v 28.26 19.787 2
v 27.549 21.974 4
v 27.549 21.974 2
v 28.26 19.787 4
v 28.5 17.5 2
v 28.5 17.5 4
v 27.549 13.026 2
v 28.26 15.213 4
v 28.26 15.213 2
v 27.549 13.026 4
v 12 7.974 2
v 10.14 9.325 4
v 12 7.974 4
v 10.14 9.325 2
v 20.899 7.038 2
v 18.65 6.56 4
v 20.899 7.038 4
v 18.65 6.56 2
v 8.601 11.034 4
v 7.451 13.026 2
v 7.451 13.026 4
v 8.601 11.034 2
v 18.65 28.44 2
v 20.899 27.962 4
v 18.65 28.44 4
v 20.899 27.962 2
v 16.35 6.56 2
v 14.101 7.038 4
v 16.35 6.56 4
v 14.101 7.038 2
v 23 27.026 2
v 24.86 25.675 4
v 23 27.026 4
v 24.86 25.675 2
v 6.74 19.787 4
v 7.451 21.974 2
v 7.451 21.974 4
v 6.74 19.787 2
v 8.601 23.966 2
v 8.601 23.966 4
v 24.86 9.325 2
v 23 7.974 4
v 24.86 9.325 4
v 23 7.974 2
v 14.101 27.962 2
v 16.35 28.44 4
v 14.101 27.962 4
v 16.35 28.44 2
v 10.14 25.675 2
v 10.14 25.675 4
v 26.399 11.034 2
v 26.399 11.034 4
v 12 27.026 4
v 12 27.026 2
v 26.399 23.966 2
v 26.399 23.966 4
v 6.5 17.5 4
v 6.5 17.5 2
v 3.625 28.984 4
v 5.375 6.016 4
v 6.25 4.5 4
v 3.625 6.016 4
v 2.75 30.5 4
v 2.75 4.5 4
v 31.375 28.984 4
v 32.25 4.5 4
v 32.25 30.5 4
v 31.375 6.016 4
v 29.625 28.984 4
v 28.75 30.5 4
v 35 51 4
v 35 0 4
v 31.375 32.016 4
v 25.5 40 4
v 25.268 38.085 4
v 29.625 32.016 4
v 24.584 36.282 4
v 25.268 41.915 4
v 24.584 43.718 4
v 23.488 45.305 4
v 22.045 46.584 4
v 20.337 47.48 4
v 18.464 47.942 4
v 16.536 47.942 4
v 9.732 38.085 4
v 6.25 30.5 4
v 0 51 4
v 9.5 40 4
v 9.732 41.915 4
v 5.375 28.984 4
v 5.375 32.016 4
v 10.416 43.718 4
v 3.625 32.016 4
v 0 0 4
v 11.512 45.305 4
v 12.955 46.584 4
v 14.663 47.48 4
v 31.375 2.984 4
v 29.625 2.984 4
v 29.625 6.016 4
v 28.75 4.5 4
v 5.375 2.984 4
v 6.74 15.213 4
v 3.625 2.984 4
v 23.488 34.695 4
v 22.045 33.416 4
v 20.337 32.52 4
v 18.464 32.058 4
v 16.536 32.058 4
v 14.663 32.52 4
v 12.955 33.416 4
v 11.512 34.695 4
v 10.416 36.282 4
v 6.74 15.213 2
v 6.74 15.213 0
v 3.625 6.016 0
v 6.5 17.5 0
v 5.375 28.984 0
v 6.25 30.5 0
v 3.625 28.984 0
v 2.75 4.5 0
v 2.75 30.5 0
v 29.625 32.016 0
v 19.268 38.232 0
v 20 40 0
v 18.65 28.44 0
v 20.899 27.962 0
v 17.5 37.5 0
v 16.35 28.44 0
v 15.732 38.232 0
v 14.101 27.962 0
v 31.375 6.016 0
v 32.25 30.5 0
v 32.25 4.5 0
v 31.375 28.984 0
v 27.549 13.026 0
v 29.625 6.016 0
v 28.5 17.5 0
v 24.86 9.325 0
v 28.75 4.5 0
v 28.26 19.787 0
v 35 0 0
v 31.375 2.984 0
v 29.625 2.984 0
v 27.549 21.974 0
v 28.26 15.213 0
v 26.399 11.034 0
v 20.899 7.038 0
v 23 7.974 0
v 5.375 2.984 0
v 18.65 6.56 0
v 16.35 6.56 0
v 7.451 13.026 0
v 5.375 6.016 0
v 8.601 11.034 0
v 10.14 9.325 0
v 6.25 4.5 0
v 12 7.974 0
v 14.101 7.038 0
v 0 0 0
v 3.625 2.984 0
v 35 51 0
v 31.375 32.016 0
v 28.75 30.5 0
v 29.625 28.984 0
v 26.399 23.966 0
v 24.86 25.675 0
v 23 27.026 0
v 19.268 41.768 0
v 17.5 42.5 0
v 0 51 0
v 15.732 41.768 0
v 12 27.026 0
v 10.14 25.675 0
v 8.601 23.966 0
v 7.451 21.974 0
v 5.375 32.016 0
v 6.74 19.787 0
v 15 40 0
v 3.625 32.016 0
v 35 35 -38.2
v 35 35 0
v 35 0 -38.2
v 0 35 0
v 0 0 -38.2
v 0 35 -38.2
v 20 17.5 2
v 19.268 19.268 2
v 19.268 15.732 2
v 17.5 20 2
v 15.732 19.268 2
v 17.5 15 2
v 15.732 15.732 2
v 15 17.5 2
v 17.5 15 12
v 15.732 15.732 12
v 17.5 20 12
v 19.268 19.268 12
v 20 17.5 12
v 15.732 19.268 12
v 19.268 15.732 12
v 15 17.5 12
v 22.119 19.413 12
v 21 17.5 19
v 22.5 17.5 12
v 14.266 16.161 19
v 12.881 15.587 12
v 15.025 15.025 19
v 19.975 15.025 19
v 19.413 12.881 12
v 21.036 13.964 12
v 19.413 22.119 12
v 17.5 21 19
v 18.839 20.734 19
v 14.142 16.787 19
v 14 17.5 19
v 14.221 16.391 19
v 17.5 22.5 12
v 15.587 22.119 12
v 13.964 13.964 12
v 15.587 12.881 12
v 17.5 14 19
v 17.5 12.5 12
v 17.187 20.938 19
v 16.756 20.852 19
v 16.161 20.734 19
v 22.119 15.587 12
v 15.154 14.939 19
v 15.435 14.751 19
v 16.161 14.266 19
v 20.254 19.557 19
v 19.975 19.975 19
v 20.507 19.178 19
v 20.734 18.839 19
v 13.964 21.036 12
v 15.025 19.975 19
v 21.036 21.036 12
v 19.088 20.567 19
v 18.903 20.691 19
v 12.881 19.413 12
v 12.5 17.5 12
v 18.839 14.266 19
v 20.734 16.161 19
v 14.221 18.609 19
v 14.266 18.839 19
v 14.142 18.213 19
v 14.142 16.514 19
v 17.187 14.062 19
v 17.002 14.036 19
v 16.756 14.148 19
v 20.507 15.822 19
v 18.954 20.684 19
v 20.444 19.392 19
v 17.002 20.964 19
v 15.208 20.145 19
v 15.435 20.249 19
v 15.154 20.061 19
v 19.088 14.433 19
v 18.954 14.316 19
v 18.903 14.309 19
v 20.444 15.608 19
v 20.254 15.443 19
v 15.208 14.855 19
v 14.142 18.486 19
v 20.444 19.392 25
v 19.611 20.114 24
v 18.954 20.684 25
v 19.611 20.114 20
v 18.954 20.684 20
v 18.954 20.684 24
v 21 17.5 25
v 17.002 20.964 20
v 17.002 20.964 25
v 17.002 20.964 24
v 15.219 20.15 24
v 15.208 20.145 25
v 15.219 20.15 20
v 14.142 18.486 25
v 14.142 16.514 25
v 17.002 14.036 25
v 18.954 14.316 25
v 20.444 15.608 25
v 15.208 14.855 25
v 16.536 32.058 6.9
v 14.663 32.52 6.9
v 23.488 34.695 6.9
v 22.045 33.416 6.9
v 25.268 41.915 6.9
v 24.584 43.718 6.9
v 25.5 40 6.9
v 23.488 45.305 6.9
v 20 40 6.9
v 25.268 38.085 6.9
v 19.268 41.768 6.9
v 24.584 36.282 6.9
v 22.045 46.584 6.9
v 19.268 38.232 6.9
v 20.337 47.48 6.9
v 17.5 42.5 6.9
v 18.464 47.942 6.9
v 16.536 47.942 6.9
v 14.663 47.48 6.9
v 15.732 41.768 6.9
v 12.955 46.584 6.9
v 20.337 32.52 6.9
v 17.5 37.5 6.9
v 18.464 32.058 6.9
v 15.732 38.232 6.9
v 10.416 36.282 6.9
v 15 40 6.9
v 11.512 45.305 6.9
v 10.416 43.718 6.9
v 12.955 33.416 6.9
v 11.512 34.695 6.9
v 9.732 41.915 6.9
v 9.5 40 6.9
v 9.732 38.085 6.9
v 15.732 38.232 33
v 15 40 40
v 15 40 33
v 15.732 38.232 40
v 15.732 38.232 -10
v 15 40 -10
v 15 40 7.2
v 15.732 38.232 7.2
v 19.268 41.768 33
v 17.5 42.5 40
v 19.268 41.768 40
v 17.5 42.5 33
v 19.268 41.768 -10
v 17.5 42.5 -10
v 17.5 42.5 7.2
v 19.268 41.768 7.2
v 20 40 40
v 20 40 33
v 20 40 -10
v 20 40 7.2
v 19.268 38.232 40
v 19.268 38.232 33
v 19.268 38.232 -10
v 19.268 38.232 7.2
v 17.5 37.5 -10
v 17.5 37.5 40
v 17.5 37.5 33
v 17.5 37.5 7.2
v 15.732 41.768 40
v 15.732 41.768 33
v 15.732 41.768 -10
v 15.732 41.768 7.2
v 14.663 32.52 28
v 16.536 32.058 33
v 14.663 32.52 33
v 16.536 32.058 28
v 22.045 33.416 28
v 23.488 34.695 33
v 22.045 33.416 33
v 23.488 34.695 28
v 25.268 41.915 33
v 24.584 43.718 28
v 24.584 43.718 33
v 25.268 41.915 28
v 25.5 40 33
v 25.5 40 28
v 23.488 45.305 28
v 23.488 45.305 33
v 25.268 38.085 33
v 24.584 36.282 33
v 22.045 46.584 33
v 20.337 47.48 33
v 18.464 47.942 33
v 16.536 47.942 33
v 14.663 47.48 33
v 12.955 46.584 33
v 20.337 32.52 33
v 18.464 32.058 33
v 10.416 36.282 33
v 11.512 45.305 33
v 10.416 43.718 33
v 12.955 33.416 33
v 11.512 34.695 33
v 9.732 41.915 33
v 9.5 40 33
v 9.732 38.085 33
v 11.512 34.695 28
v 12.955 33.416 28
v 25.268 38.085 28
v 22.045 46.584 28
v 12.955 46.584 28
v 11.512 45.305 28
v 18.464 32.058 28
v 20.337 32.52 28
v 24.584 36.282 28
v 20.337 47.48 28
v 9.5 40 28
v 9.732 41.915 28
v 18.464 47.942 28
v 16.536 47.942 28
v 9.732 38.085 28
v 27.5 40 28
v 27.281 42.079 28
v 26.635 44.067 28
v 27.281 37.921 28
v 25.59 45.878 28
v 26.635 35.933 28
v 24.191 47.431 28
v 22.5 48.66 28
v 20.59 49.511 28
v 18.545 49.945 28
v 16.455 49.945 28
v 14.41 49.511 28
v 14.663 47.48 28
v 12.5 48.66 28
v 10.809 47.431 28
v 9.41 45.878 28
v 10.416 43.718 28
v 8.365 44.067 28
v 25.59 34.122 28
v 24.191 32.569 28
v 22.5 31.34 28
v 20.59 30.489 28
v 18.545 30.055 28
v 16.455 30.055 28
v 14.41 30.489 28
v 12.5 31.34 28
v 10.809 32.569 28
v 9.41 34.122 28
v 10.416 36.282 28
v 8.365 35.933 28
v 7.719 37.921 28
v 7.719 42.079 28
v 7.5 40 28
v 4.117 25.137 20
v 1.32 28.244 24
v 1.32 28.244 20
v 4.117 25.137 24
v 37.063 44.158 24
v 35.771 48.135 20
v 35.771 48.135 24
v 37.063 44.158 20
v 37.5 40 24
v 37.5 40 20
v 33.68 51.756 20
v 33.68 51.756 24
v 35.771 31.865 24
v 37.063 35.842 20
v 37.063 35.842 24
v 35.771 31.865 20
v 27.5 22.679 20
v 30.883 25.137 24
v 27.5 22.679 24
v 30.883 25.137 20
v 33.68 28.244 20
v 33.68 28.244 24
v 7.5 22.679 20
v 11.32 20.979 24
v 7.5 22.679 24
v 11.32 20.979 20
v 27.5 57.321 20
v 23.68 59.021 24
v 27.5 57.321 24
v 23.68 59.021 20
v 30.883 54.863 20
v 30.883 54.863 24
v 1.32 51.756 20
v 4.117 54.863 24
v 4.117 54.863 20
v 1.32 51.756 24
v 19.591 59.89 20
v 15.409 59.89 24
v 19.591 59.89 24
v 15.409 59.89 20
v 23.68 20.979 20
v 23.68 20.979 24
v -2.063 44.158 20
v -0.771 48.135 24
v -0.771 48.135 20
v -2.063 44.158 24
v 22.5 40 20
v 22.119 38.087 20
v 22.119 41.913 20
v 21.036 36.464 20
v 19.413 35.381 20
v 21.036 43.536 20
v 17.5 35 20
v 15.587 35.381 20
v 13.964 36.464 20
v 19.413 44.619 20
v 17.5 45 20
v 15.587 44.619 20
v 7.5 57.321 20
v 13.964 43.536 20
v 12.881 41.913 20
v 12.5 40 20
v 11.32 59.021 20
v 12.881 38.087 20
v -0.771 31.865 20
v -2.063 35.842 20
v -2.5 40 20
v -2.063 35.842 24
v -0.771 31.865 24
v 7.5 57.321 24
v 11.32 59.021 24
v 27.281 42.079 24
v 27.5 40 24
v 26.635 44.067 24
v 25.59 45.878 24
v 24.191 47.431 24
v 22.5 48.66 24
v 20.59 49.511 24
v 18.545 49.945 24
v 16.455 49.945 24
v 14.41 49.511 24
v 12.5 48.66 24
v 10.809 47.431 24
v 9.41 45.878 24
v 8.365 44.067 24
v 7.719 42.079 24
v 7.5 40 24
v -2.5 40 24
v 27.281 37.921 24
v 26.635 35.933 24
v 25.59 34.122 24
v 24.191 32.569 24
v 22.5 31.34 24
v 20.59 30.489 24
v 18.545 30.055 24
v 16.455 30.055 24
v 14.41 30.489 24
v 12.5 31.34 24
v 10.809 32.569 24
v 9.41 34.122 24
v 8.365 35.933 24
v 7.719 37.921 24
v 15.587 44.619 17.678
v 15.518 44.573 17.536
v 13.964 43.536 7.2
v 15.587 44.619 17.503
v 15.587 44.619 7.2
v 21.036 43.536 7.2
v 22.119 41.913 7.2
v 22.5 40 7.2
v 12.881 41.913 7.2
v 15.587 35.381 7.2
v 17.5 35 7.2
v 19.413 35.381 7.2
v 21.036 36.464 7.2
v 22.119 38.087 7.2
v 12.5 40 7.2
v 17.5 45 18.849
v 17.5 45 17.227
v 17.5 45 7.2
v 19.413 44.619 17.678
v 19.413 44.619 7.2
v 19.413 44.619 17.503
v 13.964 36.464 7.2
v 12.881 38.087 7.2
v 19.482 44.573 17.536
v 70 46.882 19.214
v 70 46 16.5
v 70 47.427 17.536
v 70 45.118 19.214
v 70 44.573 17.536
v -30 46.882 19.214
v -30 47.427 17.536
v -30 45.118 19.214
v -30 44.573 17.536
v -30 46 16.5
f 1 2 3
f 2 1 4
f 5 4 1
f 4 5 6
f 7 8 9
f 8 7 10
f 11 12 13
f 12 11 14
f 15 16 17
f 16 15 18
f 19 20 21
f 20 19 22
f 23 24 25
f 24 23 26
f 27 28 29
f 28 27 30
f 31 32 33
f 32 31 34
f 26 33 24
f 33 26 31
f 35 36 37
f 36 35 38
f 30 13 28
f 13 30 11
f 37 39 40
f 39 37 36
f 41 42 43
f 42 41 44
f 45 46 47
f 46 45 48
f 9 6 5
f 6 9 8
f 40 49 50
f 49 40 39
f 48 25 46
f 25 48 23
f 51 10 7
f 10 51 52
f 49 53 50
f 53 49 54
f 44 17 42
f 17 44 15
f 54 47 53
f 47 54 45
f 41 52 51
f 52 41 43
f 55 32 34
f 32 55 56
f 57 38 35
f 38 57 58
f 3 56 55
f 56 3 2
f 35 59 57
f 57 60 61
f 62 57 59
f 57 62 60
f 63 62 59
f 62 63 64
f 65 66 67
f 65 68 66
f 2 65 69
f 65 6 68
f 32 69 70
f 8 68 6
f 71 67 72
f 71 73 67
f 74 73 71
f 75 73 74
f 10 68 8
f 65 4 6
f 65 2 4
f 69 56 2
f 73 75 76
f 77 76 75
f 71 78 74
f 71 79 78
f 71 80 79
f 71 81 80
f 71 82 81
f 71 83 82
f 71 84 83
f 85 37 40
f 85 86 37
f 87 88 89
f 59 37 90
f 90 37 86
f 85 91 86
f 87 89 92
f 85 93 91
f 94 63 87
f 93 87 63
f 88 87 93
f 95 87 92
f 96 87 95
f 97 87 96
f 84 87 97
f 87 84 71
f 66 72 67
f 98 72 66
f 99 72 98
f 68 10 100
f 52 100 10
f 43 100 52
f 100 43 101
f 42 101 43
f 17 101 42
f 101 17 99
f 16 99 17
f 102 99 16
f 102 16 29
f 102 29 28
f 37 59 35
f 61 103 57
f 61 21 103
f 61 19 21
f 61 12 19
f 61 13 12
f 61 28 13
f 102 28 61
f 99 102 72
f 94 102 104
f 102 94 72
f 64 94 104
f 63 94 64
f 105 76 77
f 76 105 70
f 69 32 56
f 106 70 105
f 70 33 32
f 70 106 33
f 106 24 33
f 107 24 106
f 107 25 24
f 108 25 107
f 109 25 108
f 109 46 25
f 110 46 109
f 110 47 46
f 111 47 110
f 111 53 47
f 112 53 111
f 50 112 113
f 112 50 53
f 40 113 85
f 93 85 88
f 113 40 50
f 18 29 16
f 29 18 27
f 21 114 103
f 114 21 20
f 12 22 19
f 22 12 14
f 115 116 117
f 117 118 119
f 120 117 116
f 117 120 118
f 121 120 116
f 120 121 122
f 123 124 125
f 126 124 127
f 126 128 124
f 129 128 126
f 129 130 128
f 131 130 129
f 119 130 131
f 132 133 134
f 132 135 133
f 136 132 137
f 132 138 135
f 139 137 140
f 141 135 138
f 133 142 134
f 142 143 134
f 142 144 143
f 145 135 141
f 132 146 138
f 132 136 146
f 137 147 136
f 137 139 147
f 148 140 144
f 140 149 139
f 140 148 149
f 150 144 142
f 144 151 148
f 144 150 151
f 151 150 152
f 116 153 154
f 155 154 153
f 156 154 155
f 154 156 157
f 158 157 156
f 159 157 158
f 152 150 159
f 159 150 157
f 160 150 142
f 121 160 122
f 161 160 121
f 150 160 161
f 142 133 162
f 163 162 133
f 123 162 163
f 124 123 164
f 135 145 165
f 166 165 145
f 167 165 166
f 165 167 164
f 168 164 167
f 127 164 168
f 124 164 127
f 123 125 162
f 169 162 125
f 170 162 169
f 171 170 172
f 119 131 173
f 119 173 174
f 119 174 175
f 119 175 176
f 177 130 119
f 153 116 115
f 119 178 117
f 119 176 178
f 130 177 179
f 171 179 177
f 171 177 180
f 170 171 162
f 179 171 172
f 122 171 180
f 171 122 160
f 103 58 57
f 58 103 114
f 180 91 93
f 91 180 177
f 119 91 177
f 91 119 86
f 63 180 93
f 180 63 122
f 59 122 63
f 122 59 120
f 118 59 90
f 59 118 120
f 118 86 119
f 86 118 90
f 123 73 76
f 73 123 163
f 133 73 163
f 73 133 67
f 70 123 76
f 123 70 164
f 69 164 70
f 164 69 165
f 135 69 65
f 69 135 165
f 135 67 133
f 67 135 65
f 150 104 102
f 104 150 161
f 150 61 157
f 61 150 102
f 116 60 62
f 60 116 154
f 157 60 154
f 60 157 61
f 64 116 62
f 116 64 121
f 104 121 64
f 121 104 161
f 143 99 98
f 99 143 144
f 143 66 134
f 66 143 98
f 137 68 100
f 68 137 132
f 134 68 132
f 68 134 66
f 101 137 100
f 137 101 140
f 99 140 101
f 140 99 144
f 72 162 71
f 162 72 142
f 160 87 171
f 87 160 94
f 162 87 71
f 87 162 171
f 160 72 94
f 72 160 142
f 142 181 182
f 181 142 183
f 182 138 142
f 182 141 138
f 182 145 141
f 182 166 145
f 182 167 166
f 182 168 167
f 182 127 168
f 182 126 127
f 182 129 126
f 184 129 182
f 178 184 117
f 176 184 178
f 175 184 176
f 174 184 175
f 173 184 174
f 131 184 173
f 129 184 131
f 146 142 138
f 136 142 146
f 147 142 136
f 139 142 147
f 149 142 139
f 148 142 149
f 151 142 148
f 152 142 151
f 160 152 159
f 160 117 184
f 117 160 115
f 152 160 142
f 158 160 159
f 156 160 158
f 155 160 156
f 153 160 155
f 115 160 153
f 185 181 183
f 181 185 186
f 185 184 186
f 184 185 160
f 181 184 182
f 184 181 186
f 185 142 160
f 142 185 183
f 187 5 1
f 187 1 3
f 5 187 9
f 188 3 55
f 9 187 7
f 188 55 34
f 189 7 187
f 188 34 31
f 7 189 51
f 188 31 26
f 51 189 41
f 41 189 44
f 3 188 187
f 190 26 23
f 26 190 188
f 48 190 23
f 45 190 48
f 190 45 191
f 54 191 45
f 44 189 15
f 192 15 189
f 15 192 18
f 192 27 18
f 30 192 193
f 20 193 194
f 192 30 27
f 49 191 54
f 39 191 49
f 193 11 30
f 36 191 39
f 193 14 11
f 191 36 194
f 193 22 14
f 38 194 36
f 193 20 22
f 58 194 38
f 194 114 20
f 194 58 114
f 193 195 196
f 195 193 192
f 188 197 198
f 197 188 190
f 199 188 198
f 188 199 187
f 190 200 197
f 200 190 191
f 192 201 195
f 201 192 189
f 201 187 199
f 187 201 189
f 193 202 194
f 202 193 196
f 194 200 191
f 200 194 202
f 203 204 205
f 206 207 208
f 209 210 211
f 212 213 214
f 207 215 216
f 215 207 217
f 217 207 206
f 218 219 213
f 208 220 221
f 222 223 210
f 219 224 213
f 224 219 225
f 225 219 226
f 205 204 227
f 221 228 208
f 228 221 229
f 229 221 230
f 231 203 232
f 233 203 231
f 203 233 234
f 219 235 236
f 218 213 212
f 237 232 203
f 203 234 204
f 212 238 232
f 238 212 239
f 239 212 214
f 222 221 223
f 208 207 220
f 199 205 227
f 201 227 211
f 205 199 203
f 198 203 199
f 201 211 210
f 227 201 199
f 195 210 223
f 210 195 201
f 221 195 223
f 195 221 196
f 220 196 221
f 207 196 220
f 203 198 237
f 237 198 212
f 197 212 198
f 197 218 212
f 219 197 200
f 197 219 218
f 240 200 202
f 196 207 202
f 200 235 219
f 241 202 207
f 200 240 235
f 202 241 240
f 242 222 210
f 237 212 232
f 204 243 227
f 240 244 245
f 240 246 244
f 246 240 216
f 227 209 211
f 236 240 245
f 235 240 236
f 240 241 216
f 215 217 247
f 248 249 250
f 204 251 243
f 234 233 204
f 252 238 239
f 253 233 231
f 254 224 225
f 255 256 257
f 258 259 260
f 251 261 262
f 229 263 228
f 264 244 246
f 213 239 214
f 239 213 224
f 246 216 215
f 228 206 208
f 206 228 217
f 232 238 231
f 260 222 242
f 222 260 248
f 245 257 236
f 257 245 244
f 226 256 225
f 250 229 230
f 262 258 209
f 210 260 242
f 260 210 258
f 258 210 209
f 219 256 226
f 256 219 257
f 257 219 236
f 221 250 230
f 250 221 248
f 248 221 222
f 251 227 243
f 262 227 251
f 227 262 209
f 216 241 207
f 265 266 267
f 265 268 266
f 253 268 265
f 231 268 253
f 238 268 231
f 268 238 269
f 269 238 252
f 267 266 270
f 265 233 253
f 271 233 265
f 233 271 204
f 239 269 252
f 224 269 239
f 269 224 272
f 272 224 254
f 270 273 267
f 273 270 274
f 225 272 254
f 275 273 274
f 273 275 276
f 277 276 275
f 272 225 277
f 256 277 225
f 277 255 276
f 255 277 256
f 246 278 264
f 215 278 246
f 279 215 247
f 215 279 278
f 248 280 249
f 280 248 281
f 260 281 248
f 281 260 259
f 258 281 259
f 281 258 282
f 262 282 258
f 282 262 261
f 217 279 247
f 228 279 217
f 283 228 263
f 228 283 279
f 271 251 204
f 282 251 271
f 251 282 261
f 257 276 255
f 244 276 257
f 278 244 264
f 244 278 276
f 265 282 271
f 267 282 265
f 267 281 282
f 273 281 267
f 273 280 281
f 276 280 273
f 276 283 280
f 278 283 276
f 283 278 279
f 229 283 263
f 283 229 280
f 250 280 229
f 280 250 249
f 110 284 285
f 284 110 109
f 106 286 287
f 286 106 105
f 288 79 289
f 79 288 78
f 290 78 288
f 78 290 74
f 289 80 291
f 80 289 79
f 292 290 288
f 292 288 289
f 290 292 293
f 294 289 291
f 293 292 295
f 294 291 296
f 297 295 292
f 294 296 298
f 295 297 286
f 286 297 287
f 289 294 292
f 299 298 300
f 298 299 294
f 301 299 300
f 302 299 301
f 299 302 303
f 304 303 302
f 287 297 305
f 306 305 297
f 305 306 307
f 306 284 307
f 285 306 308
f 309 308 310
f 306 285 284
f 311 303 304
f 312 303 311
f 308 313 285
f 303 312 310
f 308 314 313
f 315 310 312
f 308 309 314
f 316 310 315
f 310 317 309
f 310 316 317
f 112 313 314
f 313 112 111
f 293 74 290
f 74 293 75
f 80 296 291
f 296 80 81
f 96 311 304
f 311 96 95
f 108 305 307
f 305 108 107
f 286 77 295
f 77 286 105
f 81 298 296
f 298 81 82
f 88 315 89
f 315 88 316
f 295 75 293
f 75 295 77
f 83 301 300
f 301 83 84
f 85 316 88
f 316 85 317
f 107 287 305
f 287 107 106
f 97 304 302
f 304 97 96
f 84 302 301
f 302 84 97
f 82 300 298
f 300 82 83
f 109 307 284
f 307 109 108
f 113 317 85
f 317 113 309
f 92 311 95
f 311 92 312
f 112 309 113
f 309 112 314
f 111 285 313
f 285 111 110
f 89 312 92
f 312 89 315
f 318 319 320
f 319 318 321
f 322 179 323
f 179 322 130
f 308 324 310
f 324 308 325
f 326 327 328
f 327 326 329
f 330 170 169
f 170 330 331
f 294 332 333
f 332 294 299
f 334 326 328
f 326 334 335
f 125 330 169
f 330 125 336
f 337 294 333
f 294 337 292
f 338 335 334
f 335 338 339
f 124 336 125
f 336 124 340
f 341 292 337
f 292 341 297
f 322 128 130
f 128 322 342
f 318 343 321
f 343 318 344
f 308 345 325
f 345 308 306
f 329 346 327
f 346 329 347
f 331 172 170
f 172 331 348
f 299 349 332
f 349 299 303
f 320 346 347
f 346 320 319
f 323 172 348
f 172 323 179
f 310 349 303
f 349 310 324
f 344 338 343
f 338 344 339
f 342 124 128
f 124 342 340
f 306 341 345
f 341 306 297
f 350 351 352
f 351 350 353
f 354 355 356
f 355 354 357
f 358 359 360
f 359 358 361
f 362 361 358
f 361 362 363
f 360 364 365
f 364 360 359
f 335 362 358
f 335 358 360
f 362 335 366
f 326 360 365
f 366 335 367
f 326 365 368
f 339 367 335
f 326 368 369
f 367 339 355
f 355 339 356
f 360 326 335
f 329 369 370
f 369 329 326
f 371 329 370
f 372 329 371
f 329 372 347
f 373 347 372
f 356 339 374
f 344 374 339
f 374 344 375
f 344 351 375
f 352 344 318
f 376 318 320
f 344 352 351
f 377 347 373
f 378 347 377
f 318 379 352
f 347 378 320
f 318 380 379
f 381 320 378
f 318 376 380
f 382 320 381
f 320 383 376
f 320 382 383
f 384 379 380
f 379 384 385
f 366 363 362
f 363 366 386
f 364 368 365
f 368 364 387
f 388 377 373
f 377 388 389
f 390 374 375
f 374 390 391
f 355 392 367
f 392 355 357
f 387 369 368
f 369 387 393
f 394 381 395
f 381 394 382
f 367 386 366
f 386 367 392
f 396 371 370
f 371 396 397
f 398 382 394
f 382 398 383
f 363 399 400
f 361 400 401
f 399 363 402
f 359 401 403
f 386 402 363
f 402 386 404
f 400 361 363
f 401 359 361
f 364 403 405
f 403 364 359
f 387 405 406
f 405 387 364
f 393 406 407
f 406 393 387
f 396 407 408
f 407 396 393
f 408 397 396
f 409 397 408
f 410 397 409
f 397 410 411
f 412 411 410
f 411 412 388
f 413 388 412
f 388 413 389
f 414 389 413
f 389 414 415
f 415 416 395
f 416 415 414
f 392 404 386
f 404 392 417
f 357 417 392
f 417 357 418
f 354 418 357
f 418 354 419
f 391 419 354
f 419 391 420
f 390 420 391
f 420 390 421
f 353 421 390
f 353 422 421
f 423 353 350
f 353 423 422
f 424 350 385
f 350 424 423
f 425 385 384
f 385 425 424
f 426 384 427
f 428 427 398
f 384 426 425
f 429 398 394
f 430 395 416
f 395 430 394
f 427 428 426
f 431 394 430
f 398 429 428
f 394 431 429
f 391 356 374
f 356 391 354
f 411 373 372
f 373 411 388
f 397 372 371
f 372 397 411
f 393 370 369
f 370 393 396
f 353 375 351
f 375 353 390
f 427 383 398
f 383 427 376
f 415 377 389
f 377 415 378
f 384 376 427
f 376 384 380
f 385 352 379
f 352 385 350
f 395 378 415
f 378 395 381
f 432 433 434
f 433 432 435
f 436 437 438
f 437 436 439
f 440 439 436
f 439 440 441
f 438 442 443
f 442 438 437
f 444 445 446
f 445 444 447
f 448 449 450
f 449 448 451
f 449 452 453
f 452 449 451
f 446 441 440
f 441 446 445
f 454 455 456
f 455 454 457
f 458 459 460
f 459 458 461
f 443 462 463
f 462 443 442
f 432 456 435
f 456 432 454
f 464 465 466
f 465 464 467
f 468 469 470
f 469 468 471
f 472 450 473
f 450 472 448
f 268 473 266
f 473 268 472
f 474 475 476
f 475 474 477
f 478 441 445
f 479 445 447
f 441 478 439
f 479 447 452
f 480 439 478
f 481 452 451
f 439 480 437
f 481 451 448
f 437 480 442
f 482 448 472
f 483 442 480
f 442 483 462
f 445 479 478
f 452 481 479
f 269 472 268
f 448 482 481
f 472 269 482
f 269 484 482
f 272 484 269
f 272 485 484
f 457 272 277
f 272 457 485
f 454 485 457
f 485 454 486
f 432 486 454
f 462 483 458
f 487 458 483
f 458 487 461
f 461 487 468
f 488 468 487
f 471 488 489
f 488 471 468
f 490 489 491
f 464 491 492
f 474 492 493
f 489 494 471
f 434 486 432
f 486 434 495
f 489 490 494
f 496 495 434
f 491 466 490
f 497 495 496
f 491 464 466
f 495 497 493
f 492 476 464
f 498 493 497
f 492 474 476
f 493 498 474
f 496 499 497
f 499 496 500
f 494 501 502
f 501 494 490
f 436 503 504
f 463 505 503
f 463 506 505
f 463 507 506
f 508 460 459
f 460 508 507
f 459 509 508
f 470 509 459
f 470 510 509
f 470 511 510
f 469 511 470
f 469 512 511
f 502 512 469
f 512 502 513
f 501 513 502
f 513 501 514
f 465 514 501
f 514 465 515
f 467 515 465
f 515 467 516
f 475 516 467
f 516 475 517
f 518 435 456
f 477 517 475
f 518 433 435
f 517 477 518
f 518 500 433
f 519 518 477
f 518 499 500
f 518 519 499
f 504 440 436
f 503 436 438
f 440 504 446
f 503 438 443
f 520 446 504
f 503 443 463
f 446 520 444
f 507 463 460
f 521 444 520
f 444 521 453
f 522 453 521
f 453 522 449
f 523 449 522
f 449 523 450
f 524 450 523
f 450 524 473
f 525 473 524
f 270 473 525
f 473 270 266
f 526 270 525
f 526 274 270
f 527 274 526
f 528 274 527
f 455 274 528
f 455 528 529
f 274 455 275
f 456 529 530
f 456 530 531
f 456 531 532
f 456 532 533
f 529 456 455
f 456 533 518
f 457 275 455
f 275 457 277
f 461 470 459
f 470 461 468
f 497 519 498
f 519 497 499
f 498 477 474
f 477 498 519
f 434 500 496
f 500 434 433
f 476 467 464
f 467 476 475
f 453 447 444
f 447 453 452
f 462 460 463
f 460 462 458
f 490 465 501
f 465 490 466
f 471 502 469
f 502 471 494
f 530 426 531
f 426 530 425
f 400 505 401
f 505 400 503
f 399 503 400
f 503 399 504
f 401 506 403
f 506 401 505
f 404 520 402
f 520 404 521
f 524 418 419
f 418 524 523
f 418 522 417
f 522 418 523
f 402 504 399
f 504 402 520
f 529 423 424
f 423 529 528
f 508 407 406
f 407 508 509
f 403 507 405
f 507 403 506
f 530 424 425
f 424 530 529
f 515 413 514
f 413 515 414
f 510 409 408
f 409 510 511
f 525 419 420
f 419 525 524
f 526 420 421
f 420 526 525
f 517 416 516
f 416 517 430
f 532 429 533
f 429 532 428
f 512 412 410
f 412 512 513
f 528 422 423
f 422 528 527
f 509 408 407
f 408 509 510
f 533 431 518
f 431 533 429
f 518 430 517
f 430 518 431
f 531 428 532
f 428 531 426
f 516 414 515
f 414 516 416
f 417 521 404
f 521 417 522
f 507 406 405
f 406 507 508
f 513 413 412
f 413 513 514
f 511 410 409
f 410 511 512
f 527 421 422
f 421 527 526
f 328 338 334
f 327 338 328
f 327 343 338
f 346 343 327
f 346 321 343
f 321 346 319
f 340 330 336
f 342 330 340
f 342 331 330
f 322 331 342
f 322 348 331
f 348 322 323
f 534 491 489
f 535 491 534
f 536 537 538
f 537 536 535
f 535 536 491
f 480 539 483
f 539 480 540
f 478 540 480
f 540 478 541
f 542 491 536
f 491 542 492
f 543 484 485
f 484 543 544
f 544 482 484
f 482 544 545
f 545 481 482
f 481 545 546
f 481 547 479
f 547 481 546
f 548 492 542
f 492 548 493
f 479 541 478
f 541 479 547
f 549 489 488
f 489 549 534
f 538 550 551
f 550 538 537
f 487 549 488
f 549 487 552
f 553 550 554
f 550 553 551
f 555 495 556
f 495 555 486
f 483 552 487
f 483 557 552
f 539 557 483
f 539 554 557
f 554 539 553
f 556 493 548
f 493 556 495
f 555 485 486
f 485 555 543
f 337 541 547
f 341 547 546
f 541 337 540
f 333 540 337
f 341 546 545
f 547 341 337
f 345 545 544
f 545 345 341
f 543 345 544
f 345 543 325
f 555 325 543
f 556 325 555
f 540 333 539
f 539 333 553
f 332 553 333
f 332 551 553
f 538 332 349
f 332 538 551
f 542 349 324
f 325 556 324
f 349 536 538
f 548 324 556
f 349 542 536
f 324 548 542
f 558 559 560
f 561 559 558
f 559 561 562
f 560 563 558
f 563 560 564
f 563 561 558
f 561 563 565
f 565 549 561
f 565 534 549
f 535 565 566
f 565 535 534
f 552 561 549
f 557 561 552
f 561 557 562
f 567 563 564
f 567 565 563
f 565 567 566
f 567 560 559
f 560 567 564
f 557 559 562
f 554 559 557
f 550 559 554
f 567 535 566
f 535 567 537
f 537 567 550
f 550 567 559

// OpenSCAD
gear_module = 0.5;

motor_gear_teeth = 14;
motor_gear_mounting_part_length=7;
motor_gear_mounting_part_dia = 10;
motor_gear_gear_length=6;

driven_gear_teeth=80;
driven_gear_length=4;
driven_gear_hub_length=4;
driven_gear_hub_dia = 20;

filament_drive_gear_teeth = 20;
filament_drive_gear_length = 5;
filament_drive_gear_hub_length=7.8;
filament_drive_gear_hub_dia = 10;

// nema 14 motor

motor_mounting_hole_dia=3.5; // m3
motor_mounting_hole_distance = 26;
motor_size=35;
motor_depth = 38.2;
motor_shaft_length = 21.75;
motor_flange_dia = 22;
motor_flange_height = 2;
motor_shaft_dia = 5;


mount_thickness = 4;


filament_diameter = 3;




module motor_mount_part(){
	difference(){
		cube(size=[motor_size,motor_size+16,mount_thickness]);
		translate([motor_size/2,motor_size/2,0]){
			cylinder(r=motor_flange_dia/2, h=mount_thickness);	
			// motor mounting holes
			translate(v=[-motor_mounting_hole_distance/2,motor_mounting_hole_distance/2,0])  cylinder(r=motor_mounting_hole_dia/2,h=mount_thickness);
			translate(v=[motor_mounting_hole_distance/2,motor_mounting_hole_distance/2,0])  cylinder(r=motor_mounting_hole_dia/2,h=mount_thickness);
			translate(v=[-motor_mounting_hole_distance/2,-motor_mounting_hole_distance/2,0])  cylinder(r=motor_mounting_hole_dia/2,h=mount_thickness);
			translate(v=[motor_mounting_hole_distance/2,-motor_mounting_hole_distance/2,0])  cylinder(r=motor_mounting_hole_dia/2,h=mount_thickness);
		} 
	}

}

module motor(){
	union(){
		cube(size=[motor_size, motor_size, motor_depth]);
		translate(v=[motor_size/2,motor_size/2,motor_depth]) cylinder(r=motor_flange_dia/2,h=motor_flange_height);

		translate(v=[motor_size/2,motor_size/2,motor_depth+motor_flange_height]) cylinder(r=motor_shaft_dia/2,h=motor_shaft_length);
	}
}



motor_mount_part();


module bearing_625() {
	difference(){
		cylinder(r=8, h=5);
		cylinder(r=2.5, h=5);
	}
}


// parts

// motor
#translate(v=[0,0,-motor_depth]) motor();

// motor gear
translate(v=[motor_size/2,motor_size/2,motor_flange_height+10]){
	 cylinder(r1=motor_gear_mounting_part_dia/2,r2=(gear_module*motor_gear_teeth)/2, h=motor_gear_mounting_part_length) ;
	 translate(v=[0,0,motor_gear_mounting_part_length]) cylinder(r=(gear_module*motor_gear_teeth)/2, h=motor_gear_gear_length);
}

// driven gear
translate(v=[motor_size/2,(gear_module*driven_gear_teeth),10]){
	// big gear
	translate(v=[0,0,10]) cylinder(r=(gear_module*driven_gear_teeth)/2,h=driven_gear_length);
	// hub of big gear
	translate(v=[0,0,10+driven_gear_length]) cylinder(r=driven_gear_hub_dia/2,h=driven_gear_hub_length);
	
	// shaft
	translate(v=[0,0,-20])  cylinder(r=5/2,h=50);

	// filament_drive_gear 
	translate(v=[0,0,5]) color([170/255,0,0])   cylinder(r=(gear_module*filament_drive_gear_teeth)/2,h=filament_drive_gear_length);
	translate(v=[0,0,2.2-filament_drive_gear_length]) cylinder(r=filament_drive_gear_hub_dia/2,h=filament_drive_gear_hub_length);
	
	// 625 ZZ bearings
	color([0,0.7,0.6]) {
		translate(v=[0,0,-8.1]) bearing_625();
		translate(v=[0,0,18]) bearing_625();
	}
}	

// filament
translate(v=[-30,46,18]) rotate(a=90,v=[0,1,0])  color([0.2,0.6,0.2]) cylinder(r=filament_diameter/2,h=100);
